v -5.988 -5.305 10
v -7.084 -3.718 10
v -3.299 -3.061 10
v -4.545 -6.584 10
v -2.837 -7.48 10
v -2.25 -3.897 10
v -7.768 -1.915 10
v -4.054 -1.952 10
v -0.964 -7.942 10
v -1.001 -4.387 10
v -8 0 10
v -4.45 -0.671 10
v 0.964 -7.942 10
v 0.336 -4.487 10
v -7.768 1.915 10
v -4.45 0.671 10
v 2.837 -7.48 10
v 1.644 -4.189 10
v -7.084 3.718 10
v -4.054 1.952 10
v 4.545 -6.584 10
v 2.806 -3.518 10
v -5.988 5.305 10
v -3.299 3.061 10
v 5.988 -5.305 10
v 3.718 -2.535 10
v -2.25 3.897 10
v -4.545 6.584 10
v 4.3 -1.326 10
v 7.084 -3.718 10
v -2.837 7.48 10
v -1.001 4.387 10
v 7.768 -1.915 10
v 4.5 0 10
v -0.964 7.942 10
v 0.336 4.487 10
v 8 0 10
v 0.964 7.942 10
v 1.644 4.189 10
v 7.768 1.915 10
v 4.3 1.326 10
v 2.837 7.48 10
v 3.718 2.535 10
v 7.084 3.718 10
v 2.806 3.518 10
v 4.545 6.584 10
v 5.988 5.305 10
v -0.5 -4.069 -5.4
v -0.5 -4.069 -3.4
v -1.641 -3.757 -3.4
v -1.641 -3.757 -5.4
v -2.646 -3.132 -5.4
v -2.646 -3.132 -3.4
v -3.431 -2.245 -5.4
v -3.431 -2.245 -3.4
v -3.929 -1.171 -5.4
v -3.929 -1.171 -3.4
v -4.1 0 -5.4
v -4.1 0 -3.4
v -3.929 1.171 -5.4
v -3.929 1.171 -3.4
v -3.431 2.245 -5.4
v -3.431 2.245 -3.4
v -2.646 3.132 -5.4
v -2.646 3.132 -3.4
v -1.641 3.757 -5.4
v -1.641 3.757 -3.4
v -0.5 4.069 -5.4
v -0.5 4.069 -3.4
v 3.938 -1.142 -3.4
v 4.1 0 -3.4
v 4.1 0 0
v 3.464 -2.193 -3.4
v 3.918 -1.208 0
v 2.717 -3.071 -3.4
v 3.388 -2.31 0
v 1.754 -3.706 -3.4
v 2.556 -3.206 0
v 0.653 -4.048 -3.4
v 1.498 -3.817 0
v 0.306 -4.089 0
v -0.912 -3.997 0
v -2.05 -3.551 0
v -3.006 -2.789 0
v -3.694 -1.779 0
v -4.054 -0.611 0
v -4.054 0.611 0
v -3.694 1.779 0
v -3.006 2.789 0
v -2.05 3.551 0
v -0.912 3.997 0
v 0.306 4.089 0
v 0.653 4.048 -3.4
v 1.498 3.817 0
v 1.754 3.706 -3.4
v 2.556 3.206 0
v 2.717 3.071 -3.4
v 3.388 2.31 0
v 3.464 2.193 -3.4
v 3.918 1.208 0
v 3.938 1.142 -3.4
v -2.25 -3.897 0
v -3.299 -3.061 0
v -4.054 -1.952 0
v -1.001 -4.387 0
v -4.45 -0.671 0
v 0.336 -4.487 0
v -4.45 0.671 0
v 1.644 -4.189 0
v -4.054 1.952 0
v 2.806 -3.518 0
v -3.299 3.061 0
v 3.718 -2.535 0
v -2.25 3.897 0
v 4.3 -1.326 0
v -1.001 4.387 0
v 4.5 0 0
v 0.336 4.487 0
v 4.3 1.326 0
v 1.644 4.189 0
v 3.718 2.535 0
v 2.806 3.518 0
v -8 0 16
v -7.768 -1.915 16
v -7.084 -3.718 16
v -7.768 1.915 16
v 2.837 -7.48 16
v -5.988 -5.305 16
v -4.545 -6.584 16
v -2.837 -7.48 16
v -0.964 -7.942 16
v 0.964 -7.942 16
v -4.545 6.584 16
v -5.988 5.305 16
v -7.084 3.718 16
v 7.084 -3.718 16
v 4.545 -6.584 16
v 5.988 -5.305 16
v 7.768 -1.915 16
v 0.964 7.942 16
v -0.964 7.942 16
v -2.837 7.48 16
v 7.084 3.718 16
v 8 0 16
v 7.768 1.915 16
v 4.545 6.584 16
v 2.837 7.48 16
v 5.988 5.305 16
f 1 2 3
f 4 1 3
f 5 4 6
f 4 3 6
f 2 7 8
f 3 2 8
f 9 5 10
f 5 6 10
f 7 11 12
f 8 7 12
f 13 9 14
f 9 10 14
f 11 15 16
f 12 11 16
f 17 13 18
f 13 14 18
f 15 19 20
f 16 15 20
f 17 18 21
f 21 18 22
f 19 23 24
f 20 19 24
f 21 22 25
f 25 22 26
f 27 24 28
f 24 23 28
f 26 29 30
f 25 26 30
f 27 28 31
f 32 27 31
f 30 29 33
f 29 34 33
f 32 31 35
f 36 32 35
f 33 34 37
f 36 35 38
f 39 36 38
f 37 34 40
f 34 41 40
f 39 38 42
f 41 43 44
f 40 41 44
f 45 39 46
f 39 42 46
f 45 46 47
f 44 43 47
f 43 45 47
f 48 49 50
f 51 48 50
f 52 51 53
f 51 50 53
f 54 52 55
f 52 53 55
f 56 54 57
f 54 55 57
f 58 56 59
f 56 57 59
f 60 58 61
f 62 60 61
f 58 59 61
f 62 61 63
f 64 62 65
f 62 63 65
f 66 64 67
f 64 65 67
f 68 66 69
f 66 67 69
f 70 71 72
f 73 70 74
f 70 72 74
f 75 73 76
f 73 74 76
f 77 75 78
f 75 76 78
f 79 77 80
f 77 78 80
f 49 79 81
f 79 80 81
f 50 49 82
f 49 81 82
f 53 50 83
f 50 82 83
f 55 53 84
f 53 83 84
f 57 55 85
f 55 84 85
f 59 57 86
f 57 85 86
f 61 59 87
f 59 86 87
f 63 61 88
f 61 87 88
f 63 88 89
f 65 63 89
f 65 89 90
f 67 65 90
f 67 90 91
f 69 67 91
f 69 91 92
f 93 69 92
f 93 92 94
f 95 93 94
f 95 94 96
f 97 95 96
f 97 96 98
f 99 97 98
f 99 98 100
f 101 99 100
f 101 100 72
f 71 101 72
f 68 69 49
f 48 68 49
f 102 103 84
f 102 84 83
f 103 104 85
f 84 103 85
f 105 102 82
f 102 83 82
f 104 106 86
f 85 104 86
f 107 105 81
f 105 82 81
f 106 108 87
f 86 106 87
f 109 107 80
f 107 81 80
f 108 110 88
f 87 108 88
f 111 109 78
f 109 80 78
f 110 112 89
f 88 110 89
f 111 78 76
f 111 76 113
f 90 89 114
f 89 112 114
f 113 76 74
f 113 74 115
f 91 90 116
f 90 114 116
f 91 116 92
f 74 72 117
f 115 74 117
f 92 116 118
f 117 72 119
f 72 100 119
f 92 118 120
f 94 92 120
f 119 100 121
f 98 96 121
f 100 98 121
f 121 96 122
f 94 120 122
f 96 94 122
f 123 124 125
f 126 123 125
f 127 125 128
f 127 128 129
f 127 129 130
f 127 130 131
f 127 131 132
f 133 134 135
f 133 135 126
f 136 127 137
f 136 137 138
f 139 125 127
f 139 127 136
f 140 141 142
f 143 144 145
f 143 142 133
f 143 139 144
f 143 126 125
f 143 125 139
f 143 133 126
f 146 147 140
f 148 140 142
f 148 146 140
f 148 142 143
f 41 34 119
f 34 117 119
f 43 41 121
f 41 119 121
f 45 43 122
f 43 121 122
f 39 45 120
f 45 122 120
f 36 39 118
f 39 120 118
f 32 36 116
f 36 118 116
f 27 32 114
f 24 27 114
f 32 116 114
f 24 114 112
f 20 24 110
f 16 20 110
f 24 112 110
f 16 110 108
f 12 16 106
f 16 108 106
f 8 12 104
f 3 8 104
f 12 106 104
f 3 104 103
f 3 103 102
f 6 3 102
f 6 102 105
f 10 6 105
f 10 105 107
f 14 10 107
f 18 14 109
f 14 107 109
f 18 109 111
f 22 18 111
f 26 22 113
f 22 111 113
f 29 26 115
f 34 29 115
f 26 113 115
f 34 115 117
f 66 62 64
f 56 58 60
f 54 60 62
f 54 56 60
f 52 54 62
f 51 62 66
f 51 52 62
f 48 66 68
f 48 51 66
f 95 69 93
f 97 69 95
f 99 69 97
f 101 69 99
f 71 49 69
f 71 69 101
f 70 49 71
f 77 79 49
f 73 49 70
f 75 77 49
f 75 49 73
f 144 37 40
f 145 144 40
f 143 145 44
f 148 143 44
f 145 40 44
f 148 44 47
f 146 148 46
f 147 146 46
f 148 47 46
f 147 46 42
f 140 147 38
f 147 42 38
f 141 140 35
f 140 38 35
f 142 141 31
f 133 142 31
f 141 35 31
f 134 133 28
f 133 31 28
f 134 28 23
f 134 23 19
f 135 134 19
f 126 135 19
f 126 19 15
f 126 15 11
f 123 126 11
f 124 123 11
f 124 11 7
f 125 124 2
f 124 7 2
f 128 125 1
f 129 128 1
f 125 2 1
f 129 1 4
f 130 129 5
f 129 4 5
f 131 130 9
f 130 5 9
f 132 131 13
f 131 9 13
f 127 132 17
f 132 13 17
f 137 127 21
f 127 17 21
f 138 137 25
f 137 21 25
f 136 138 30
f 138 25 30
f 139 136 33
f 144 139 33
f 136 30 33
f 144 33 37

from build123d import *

# Parameters (mm, degrees)
F0_R     = 4.5
F1_DEPTH = 8
F2_R     = 4.5
F3_DEPTH = 2
F4_R     = 8
F5_DEPTH = 6
F6_R     = 4.1
F7_DEPTH = 3.4
F9_DEPTH = 2


# Not quite as in the source:
# - a feature names something its author has since deleted; it is built from what else it names


with BuildPart() as f1:
    # F0 (on Top) → F1 (new body)
    with BuildSketch(Plane.XY):
        Circle(F0_R)
    extrude(amount=F1_DEPTH)

    # F2 (on face) → F3 (join)
    with BuildSketch(Plane.XY.offset(8)):
        Circle(F2_R)
    extrude(amount=F3_DEPTH)

    # F4 (on face) → F5 (join)
    with BuildSketch(Plane.XY.offset(10)):
        Circle(F4_R)
    extrude(amount=F5_DEPTH)

    # F6 (on face) → F7 (join)
    with BuildSketch(Plane(origin=(0, 0, 0), x_dir=(1, 0, 0), z_dir=(0, 0, -1))):
        Circle(F6_R)
    extrude(amount=F7_DEPTH)

    # F8 (on face) → F9 (join)
    with BuildSketch(Plane(origin=(0, 0, -3.4), x_dir=(1, 0, 0), z_dir=(0, 0, -1))):
        with BuildLine():
            Line((-0.499664308, 0), (-0.499664308, 4.0694392217))
            ThreePointArc((-0.499664308, 4.0694392217), (-4.1, 0), (-0.499664308, -4.0694392217))
            Line((-0.499664308, -4.0694392217), (-0.499664308, 0))
        make_face()
    extrude(amount=F9_DEPTH)


solid = f1.part
